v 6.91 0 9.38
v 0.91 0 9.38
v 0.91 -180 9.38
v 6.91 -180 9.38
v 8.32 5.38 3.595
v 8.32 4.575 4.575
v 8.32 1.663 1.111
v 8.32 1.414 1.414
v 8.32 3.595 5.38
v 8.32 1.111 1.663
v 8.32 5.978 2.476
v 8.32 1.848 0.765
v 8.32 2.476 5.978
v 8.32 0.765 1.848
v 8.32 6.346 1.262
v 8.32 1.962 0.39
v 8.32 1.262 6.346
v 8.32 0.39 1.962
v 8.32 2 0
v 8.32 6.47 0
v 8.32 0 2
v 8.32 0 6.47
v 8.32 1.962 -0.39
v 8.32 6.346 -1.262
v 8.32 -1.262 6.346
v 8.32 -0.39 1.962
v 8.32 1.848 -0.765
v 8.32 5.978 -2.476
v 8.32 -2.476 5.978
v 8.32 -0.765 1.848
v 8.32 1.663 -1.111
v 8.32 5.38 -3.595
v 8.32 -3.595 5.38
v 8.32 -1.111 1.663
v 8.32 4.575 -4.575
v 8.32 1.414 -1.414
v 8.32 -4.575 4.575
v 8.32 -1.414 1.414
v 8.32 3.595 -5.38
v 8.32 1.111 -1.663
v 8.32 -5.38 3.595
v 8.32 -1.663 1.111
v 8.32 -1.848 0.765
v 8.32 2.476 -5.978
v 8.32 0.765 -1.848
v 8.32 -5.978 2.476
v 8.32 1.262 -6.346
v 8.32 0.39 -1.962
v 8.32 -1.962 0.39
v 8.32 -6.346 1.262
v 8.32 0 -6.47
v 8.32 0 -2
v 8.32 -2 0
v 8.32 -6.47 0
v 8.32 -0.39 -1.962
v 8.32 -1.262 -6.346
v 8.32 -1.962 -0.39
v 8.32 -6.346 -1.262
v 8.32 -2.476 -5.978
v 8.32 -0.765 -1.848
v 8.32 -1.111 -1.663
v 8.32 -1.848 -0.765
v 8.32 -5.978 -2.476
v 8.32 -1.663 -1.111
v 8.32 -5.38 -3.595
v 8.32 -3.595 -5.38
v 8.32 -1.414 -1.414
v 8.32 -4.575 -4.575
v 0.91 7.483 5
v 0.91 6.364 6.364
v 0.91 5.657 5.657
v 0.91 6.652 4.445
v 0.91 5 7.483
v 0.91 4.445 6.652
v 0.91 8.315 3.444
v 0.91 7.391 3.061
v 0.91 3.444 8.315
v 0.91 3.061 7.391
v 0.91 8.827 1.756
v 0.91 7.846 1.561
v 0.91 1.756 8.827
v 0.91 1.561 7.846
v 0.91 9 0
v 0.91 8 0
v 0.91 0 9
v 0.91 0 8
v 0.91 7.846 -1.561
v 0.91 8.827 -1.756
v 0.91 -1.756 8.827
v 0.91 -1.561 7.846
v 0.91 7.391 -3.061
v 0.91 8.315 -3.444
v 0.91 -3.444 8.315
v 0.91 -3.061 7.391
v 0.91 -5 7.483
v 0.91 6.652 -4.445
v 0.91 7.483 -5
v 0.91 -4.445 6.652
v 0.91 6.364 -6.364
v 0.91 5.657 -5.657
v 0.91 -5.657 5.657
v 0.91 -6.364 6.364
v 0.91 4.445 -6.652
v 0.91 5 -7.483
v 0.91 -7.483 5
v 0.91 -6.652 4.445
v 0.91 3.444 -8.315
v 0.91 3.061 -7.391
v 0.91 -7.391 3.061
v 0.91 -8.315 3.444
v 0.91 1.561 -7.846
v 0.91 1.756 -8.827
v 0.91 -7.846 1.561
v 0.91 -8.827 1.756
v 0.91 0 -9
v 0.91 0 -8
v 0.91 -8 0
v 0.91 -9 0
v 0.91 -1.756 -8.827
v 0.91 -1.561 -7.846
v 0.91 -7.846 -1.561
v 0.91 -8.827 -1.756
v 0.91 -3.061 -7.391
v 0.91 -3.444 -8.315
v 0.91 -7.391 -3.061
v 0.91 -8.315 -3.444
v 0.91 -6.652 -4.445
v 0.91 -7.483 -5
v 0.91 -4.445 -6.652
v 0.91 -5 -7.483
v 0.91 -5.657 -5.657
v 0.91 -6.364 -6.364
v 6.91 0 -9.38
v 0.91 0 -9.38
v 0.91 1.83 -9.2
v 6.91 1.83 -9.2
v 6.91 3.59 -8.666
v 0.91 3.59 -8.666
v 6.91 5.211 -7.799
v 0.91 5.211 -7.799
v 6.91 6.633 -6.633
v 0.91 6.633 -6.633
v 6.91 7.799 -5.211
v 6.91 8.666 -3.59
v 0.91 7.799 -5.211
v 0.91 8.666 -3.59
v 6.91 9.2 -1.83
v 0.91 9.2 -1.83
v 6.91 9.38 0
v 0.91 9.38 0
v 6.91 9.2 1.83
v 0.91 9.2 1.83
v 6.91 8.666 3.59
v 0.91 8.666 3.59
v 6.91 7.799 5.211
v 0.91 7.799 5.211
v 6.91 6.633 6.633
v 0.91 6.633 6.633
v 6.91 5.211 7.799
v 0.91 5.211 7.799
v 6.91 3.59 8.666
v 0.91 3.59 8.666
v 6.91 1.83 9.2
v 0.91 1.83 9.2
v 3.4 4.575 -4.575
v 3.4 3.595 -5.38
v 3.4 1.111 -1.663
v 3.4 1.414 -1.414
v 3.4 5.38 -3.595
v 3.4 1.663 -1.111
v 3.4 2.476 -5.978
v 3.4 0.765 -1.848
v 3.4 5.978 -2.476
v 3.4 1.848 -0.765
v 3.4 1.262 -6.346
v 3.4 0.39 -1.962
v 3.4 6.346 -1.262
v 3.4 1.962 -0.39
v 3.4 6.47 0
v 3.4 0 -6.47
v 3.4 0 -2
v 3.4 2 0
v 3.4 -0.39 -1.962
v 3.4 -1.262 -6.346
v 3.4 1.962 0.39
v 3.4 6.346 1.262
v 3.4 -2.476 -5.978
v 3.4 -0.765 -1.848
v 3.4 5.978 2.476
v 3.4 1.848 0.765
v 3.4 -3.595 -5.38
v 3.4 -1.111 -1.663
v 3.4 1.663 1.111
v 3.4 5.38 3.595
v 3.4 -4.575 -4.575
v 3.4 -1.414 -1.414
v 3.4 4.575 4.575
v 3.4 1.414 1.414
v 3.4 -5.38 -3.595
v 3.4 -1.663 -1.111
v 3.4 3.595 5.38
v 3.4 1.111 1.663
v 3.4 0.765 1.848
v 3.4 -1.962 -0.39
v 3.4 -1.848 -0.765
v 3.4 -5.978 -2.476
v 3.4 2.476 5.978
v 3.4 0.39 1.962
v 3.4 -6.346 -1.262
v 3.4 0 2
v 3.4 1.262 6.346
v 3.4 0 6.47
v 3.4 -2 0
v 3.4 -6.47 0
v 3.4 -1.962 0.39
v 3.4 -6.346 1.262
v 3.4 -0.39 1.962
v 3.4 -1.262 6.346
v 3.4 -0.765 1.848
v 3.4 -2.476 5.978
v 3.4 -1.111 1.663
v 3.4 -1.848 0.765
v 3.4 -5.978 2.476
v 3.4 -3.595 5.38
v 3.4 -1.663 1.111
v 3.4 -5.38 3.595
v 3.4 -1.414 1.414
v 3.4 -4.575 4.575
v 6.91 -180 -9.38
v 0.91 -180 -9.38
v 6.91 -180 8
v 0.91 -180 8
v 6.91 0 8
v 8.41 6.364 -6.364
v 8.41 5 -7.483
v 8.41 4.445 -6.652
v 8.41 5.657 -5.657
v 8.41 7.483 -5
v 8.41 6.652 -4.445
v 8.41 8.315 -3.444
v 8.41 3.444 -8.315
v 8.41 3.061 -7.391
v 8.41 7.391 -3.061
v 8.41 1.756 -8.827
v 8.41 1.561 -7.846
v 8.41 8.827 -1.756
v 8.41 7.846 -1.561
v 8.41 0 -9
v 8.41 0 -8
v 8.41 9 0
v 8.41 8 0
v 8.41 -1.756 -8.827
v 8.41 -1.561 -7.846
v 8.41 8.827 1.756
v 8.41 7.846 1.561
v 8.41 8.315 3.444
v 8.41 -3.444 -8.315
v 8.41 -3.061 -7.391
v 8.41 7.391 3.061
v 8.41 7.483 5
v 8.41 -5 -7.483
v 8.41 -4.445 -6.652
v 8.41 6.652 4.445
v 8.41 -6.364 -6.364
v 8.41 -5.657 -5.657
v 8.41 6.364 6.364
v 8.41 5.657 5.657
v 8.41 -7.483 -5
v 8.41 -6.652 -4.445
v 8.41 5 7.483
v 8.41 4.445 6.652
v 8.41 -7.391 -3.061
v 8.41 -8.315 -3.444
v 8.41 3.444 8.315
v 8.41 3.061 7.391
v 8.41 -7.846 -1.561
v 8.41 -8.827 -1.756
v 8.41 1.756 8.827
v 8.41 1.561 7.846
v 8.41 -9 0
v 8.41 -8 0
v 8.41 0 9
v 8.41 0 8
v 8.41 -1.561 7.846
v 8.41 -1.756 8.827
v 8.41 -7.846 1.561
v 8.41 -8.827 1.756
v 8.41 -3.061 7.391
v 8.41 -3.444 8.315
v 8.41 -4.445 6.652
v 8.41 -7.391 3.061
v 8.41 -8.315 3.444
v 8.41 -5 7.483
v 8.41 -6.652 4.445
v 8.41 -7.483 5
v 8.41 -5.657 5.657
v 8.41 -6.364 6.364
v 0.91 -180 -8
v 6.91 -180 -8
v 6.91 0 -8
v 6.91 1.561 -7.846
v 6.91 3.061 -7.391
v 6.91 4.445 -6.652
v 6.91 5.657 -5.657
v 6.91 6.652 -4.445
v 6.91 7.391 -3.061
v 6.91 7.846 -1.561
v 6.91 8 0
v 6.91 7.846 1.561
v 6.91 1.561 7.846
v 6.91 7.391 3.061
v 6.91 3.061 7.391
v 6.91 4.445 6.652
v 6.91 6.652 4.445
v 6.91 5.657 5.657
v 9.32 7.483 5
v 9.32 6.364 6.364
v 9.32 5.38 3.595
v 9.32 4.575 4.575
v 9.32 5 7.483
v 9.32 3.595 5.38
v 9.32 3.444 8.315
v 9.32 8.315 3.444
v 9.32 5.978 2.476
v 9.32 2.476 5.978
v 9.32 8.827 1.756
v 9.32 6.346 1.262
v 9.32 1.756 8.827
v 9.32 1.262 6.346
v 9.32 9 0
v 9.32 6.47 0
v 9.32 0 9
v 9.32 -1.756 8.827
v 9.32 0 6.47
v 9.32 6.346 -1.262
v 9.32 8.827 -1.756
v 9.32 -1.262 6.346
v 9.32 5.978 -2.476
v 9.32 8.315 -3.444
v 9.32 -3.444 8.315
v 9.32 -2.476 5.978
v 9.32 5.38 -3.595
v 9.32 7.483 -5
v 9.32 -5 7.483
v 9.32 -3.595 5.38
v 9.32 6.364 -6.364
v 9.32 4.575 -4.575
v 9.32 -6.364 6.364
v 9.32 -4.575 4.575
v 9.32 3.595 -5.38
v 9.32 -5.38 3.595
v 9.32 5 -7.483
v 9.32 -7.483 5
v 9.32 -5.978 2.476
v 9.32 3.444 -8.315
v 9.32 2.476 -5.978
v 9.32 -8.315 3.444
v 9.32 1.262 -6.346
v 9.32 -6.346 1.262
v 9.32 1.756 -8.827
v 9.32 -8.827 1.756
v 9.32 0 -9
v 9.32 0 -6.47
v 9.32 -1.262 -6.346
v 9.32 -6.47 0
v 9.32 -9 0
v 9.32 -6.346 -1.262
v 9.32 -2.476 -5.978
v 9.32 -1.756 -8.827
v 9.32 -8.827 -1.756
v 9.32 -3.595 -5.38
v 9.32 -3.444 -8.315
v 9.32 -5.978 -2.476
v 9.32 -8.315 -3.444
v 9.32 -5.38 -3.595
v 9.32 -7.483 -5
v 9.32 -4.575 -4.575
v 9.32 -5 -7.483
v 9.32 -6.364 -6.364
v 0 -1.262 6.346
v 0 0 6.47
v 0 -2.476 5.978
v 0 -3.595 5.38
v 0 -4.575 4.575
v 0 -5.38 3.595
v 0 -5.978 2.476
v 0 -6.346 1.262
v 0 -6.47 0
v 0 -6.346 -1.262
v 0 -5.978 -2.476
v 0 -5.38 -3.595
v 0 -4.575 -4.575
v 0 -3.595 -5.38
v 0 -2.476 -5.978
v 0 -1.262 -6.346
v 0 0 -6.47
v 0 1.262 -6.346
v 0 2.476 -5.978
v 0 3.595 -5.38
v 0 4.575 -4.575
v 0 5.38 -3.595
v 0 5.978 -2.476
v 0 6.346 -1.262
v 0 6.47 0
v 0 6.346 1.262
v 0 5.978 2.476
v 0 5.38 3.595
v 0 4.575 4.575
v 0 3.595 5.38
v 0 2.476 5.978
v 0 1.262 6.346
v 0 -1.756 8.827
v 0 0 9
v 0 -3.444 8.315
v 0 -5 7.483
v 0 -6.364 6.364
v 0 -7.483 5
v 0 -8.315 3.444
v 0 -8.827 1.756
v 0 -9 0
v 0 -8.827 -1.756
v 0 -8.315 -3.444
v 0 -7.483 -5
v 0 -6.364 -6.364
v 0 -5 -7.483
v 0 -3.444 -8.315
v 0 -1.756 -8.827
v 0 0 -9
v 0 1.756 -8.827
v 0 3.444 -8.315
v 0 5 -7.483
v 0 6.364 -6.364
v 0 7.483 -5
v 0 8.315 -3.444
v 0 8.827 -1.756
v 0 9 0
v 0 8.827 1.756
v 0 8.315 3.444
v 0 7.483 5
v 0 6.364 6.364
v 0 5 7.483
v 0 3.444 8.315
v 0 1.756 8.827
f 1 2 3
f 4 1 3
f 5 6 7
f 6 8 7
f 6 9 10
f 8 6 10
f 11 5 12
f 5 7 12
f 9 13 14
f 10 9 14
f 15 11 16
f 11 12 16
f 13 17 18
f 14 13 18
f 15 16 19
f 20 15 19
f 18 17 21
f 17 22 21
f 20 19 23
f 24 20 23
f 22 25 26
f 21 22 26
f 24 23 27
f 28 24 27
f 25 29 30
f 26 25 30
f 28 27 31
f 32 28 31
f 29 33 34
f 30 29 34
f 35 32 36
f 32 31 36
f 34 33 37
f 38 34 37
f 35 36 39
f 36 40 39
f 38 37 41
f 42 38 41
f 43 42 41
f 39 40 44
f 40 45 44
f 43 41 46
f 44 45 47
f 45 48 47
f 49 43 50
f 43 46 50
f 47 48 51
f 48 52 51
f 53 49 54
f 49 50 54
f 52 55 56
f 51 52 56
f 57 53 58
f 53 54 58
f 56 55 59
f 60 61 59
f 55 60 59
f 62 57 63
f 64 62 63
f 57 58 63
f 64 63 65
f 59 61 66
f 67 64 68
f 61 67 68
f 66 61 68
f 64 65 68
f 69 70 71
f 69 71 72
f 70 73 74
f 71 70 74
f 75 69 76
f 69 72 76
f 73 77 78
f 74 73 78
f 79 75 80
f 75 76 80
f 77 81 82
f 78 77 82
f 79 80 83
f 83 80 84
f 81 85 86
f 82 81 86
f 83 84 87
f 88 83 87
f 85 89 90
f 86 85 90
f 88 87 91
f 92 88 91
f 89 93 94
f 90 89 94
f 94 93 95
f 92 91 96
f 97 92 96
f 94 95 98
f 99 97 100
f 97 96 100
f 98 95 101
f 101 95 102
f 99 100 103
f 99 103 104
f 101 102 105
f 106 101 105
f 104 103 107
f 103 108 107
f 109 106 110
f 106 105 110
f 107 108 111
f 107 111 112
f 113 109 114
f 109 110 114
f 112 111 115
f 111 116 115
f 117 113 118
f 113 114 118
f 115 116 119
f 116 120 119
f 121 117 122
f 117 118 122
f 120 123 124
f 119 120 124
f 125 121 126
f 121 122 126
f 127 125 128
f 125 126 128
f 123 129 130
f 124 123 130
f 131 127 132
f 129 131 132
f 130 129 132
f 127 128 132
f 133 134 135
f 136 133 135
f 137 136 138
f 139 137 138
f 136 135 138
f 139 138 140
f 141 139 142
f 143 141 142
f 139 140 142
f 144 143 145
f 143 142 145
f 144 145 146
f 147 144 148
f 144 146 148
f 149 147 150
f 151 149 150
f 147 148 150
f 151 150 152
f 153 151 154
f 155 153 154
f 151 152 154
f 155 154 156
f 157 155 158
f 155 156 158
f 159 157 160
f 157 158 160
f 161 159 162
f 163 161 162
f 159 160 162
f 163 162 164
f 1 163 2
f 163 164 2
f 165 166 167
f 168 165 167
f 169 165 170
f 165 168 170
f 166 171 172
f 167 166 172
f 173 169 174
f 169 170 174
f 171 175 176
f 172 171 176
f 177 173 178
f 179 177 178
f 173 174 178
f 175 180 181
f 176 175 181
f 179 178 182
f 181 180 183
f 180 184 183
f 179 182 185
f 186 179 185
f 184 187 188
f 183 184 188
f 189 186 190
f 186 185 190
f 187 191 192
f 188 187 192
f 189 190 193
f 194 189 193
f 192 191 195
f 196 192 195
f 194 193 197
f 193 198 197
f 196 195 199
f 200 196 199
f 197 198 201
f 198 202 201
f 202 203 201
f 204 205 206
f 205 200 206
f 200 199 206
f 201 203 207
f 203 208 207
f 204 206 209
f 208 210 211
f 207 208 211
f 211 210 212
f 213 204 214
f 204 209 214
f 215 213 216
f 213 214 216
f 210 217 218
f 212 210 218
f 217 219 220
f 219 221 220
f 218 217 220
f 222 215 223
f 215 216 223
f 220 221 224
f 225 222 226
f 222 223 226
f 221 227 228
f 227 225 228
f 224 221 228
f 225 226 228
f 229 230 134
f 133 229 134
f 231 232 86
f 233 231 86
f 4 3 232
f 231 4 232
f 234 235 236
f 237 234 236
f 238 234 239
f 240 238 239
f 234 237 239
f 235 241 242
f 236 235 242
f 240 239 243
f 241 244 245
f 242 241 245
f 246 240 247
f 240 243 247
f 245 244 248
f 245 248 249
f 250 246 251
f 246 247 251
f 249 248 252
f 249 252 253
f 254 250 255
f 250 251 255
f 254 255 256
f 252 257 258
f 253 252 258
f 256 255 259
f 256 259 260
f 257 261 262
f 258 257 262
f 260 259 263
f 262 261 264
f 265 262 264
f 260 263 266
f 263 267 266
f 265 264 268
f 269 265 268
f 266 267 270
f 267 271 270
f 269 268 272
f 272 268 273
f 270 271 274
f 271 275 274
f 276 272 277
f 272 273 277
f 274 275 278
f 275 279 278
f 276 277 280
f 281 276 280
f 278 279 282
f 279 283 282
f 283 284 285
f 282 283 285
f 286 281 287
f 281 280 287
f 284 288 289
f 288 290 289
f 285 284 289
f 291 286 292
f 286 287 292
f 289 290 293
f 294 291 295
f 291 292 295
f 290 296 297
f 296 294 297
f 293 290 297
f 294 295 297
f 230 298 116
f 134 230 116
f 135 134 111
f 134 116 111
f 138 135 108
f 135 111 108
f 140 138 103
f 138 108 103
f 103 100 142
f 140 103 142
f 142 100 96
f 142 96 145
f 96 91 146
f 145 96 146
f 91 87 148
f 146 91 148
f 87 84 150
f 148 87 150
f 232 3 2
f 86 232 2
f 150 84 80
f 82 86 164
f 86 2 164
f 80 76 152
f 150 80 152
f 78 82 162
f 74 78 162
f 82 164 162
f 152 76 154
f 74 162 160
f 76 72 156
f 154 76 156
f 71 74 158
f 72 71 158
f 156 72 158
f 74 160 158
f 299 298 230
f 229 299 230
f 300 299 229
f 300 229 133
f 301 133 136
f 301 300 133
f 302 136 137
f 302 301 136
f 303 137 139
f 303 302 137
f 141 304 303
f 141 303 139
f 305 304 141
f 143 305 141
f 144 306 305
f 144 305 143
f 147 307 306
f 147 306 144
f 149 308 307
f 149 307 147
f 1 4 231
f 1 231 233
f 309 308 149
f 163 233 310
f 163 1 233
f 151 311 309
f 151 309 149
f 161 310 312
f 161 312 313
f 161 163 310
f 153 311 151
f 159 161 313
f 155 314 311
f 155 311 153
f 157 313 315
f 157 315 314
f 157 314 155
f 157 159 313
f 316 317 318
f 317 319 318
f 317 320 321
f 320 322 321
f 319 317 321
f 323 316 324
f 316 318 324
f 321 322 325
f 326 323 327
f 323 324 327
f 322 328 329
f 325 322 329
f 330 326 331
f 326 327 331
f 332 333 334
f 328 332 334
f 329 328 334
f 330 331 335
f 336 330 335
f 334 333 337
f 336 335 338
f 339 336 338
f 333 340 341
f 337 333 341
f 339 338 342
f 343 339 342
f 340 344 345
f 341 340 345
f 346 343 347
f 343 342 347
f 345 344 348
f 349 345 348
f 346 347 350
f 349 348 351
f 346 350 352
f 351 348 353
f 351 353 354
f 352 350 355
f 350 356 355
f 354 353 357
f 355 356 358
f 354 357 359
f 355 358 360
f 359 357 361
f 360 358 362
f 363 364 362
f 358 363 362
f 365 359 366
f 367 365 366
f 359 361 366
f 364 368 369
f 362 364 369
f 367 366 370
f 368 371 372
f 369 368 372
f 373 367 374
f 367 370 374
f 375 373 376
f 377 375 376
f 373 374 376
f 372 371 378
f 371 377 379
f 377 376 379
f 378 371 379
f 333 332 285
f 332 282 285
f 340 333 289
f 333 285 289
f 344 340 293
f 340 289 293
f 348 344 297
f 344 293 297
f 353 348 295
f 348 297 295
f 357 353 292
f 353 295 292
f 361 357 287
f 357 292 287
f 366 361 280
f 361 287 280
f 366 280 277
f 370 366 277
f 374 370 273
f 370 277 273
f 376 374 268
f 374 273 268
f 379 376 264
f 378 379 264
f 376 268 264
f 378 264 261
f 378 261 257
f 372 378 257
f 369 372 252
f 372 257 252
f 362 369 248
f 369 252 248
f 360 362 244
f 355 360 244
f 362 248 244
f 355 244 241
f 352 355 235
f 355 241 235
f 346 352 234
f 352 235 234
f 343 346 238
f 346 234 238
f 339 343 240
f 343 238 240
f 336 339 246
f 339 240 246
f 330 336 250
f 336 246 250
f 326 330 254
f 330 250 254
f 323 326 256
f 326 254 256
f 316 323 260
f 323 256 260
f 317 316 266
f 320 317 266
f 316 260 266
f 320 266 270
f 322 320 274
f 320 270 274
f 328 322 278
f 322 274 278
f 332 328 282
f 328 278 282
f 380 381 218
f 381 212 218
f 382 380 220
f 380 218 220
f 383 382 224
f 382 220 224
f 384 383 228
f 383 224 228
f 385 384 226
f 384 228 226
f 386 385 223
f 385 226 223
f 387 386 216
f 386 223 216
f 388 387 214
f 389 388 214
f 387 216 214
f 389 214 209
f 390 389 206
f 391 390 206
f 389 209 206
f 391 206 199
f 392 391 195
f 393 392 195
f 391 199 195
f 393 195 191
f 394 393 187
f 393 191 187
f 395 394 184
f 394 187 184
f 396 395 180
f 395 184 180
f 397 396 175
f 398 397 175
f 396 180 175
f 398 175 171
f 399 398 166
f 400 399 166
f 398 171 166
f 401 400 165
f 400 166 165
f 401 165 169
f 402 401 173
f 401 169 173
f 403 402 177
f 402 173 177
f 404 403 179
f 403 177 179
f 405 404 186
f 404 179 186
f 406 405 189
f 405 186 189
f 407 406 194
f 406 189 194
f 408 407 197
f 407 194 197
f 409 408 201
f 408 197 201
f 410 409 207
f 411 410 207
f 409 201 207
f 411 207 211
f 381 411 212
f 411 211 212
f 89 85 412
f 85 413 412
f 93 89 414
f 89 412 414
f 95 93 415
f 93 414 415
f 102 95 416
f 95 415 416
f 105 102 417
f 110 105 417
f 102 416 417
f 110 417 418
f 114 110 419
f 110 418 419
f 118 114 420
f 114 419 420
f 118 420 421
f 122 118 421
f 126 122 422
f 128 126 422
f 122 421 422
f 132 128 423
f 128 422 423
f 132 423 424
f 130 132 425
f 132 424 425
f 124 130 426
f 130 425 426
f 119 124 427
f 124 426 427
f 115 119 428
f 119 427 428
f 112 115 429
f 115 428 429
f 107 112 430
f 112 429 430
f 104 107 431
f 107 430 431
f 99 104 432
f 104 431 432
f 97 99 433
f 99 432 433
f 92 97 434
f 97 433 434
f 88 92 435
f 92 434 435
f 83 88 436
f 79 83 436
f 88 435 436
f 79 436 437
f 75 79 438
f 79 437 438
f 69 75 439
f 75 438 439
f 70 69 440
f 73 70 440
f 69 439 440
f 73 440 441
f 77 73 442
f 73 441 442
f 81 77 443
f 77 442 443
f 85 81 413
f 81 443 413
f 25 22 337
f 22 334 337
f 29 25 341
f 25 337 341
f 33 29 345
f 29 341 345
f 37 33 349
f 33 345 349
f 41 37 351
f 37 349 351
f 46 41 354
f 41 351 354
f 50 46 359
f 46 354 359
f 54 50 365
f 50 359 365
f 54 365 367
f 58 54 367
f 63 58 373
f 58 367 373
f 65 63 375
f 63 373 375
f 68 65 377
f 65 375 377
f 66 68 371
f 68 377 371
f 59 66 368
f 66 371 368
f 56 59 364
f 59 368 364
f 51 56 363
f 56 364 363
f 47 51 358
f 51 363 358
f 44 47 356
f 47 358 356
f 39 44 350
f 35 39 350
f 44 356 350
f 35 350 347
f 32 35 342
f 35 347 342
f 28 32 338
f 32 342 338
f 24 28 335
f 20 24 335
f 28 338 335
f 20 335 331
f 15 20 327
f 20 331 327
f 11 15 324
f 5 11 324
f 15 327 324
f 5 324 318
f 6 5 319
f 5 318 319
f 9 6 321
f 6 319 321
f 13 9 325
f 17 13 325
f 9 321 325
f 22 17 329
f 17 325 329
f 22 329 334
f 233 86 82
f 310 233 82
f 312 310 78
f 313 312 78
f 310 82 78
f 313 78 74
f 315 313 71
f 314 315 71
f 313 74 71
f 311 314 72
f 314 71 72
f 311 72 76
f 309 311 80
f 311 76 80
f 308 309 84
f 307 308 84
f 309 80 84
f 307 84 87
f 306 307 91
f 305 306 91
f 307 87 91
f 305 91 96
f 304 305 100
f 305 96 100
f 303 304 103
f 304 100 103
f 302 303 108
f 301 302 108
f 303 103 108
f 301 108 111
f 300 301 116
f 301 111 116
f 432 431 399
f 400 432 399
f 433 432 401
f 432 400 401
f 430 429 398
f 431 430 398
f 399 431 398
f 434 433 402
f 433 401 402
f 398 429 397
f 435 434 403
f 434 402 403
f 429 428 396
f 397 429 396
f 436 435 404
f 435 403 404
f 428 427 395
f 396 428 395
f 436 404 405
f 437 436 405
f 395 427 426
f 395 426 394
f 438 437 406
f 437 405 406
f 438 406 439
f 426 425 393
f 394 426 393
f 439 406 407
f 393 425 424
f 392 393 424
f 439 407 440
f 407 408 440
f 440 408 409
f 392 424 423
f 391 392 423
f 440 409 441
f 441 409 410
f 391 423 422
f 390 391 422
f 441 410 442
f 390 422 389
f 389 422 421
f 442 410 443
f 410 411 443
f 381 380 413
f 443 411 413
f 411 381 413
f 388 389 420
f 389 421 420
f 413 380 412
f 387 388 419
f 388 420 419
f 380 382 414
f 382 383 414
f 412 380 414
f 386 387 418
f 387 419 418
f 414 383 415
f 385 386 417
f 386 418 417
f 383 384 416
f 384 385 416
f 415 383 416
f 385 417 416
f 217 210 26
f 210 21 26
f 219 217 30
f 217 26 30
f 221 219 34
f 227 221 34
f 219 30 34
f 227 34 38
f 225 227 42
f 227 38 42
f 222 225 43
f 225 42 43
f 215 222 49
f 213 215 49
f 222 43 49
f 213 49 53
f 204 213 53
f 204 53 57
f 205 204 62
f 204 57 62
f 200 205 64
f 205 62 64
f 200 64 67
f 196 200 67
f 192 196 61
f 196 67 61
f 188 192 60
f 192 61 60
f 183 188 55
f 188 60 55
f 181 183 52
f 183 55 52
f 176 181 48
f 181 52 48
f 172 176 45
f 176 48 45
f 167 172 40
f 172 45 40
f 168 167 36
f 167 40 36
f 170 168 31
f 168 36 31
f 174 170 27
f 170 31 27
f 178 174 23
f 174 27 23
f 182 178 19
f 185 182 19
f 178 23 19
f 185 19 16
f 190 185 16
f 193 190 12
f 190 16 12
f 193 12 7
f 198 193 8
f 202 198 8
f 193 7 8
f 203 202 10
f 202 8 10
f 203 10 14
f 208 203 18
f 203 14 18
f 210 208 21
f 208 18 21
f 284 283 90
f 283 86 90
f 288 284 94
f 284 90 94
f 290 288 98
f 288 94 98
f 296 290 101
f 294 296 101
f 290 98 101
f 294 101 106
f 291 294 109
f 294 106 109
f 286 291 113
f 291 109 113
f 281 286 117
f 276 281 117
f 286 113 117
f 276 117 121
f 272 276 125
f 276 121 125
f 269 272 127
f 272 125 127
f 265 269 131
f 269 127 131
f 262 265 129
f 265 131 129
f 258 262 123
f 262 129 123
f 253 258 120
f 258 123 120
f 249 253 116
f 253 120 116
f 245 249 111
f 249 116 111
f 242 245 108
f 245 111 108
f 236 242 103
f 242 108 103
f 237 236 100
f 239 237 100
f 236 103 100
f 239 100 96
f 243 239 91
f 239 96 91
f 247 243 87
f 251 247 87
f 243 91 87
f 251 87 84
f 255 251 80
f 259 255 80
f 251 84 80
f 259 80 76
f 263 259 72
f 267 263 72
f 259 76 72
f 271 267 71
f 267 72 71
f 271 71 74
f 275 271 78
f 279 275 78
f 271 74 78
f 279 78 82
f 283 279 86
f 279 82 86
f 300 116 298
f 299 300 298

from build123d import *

# Parameters (mm, degrees)
F3_DEPTH = 6


with BuildPart() as f1:
    # F0 (on Front) → F1 (revolve)
    with BuildSketch(Plane.XZ):
        Polygon((0, 9), (0, 6.47), (3.4, 6.47), (3.4, 2), (8.32, 2), (8.32, 6.47), (9.32, 6.47), (9.32, 9), (8.41, 9), (8.41, 8), (0.91, 8), (0.91, 9), align=None)
    revolve(axis=Axis((4.66, 0, 0), (1, 0, 0)))


with BuildPart() as f3:
    # F2 (on face) → F3 (new body)
    with BuildSketch(Plane.YZ.offset(0.91)):
        with BuildLine():
            ThreePointArc((0, 8), (8, 0), (0, -8))
            Line((0, -8), (-180, -8))
            Line((-180, -8), (-180, -9.38))
            Line((-180, -9.38), (0, -9.38))
            ThreePointArc((0, -9.38), (9.38, 0), (0, 9.38))
            Line((0, 9.38), (-180, 9.38))
            Line((-180, 9.38), (-180, 8))
            Line((-180, 8), (0, 8))
        make_face()
    extrude(amount=F3_DEPTH)


solid = Compound([f1.part, f3.part])
